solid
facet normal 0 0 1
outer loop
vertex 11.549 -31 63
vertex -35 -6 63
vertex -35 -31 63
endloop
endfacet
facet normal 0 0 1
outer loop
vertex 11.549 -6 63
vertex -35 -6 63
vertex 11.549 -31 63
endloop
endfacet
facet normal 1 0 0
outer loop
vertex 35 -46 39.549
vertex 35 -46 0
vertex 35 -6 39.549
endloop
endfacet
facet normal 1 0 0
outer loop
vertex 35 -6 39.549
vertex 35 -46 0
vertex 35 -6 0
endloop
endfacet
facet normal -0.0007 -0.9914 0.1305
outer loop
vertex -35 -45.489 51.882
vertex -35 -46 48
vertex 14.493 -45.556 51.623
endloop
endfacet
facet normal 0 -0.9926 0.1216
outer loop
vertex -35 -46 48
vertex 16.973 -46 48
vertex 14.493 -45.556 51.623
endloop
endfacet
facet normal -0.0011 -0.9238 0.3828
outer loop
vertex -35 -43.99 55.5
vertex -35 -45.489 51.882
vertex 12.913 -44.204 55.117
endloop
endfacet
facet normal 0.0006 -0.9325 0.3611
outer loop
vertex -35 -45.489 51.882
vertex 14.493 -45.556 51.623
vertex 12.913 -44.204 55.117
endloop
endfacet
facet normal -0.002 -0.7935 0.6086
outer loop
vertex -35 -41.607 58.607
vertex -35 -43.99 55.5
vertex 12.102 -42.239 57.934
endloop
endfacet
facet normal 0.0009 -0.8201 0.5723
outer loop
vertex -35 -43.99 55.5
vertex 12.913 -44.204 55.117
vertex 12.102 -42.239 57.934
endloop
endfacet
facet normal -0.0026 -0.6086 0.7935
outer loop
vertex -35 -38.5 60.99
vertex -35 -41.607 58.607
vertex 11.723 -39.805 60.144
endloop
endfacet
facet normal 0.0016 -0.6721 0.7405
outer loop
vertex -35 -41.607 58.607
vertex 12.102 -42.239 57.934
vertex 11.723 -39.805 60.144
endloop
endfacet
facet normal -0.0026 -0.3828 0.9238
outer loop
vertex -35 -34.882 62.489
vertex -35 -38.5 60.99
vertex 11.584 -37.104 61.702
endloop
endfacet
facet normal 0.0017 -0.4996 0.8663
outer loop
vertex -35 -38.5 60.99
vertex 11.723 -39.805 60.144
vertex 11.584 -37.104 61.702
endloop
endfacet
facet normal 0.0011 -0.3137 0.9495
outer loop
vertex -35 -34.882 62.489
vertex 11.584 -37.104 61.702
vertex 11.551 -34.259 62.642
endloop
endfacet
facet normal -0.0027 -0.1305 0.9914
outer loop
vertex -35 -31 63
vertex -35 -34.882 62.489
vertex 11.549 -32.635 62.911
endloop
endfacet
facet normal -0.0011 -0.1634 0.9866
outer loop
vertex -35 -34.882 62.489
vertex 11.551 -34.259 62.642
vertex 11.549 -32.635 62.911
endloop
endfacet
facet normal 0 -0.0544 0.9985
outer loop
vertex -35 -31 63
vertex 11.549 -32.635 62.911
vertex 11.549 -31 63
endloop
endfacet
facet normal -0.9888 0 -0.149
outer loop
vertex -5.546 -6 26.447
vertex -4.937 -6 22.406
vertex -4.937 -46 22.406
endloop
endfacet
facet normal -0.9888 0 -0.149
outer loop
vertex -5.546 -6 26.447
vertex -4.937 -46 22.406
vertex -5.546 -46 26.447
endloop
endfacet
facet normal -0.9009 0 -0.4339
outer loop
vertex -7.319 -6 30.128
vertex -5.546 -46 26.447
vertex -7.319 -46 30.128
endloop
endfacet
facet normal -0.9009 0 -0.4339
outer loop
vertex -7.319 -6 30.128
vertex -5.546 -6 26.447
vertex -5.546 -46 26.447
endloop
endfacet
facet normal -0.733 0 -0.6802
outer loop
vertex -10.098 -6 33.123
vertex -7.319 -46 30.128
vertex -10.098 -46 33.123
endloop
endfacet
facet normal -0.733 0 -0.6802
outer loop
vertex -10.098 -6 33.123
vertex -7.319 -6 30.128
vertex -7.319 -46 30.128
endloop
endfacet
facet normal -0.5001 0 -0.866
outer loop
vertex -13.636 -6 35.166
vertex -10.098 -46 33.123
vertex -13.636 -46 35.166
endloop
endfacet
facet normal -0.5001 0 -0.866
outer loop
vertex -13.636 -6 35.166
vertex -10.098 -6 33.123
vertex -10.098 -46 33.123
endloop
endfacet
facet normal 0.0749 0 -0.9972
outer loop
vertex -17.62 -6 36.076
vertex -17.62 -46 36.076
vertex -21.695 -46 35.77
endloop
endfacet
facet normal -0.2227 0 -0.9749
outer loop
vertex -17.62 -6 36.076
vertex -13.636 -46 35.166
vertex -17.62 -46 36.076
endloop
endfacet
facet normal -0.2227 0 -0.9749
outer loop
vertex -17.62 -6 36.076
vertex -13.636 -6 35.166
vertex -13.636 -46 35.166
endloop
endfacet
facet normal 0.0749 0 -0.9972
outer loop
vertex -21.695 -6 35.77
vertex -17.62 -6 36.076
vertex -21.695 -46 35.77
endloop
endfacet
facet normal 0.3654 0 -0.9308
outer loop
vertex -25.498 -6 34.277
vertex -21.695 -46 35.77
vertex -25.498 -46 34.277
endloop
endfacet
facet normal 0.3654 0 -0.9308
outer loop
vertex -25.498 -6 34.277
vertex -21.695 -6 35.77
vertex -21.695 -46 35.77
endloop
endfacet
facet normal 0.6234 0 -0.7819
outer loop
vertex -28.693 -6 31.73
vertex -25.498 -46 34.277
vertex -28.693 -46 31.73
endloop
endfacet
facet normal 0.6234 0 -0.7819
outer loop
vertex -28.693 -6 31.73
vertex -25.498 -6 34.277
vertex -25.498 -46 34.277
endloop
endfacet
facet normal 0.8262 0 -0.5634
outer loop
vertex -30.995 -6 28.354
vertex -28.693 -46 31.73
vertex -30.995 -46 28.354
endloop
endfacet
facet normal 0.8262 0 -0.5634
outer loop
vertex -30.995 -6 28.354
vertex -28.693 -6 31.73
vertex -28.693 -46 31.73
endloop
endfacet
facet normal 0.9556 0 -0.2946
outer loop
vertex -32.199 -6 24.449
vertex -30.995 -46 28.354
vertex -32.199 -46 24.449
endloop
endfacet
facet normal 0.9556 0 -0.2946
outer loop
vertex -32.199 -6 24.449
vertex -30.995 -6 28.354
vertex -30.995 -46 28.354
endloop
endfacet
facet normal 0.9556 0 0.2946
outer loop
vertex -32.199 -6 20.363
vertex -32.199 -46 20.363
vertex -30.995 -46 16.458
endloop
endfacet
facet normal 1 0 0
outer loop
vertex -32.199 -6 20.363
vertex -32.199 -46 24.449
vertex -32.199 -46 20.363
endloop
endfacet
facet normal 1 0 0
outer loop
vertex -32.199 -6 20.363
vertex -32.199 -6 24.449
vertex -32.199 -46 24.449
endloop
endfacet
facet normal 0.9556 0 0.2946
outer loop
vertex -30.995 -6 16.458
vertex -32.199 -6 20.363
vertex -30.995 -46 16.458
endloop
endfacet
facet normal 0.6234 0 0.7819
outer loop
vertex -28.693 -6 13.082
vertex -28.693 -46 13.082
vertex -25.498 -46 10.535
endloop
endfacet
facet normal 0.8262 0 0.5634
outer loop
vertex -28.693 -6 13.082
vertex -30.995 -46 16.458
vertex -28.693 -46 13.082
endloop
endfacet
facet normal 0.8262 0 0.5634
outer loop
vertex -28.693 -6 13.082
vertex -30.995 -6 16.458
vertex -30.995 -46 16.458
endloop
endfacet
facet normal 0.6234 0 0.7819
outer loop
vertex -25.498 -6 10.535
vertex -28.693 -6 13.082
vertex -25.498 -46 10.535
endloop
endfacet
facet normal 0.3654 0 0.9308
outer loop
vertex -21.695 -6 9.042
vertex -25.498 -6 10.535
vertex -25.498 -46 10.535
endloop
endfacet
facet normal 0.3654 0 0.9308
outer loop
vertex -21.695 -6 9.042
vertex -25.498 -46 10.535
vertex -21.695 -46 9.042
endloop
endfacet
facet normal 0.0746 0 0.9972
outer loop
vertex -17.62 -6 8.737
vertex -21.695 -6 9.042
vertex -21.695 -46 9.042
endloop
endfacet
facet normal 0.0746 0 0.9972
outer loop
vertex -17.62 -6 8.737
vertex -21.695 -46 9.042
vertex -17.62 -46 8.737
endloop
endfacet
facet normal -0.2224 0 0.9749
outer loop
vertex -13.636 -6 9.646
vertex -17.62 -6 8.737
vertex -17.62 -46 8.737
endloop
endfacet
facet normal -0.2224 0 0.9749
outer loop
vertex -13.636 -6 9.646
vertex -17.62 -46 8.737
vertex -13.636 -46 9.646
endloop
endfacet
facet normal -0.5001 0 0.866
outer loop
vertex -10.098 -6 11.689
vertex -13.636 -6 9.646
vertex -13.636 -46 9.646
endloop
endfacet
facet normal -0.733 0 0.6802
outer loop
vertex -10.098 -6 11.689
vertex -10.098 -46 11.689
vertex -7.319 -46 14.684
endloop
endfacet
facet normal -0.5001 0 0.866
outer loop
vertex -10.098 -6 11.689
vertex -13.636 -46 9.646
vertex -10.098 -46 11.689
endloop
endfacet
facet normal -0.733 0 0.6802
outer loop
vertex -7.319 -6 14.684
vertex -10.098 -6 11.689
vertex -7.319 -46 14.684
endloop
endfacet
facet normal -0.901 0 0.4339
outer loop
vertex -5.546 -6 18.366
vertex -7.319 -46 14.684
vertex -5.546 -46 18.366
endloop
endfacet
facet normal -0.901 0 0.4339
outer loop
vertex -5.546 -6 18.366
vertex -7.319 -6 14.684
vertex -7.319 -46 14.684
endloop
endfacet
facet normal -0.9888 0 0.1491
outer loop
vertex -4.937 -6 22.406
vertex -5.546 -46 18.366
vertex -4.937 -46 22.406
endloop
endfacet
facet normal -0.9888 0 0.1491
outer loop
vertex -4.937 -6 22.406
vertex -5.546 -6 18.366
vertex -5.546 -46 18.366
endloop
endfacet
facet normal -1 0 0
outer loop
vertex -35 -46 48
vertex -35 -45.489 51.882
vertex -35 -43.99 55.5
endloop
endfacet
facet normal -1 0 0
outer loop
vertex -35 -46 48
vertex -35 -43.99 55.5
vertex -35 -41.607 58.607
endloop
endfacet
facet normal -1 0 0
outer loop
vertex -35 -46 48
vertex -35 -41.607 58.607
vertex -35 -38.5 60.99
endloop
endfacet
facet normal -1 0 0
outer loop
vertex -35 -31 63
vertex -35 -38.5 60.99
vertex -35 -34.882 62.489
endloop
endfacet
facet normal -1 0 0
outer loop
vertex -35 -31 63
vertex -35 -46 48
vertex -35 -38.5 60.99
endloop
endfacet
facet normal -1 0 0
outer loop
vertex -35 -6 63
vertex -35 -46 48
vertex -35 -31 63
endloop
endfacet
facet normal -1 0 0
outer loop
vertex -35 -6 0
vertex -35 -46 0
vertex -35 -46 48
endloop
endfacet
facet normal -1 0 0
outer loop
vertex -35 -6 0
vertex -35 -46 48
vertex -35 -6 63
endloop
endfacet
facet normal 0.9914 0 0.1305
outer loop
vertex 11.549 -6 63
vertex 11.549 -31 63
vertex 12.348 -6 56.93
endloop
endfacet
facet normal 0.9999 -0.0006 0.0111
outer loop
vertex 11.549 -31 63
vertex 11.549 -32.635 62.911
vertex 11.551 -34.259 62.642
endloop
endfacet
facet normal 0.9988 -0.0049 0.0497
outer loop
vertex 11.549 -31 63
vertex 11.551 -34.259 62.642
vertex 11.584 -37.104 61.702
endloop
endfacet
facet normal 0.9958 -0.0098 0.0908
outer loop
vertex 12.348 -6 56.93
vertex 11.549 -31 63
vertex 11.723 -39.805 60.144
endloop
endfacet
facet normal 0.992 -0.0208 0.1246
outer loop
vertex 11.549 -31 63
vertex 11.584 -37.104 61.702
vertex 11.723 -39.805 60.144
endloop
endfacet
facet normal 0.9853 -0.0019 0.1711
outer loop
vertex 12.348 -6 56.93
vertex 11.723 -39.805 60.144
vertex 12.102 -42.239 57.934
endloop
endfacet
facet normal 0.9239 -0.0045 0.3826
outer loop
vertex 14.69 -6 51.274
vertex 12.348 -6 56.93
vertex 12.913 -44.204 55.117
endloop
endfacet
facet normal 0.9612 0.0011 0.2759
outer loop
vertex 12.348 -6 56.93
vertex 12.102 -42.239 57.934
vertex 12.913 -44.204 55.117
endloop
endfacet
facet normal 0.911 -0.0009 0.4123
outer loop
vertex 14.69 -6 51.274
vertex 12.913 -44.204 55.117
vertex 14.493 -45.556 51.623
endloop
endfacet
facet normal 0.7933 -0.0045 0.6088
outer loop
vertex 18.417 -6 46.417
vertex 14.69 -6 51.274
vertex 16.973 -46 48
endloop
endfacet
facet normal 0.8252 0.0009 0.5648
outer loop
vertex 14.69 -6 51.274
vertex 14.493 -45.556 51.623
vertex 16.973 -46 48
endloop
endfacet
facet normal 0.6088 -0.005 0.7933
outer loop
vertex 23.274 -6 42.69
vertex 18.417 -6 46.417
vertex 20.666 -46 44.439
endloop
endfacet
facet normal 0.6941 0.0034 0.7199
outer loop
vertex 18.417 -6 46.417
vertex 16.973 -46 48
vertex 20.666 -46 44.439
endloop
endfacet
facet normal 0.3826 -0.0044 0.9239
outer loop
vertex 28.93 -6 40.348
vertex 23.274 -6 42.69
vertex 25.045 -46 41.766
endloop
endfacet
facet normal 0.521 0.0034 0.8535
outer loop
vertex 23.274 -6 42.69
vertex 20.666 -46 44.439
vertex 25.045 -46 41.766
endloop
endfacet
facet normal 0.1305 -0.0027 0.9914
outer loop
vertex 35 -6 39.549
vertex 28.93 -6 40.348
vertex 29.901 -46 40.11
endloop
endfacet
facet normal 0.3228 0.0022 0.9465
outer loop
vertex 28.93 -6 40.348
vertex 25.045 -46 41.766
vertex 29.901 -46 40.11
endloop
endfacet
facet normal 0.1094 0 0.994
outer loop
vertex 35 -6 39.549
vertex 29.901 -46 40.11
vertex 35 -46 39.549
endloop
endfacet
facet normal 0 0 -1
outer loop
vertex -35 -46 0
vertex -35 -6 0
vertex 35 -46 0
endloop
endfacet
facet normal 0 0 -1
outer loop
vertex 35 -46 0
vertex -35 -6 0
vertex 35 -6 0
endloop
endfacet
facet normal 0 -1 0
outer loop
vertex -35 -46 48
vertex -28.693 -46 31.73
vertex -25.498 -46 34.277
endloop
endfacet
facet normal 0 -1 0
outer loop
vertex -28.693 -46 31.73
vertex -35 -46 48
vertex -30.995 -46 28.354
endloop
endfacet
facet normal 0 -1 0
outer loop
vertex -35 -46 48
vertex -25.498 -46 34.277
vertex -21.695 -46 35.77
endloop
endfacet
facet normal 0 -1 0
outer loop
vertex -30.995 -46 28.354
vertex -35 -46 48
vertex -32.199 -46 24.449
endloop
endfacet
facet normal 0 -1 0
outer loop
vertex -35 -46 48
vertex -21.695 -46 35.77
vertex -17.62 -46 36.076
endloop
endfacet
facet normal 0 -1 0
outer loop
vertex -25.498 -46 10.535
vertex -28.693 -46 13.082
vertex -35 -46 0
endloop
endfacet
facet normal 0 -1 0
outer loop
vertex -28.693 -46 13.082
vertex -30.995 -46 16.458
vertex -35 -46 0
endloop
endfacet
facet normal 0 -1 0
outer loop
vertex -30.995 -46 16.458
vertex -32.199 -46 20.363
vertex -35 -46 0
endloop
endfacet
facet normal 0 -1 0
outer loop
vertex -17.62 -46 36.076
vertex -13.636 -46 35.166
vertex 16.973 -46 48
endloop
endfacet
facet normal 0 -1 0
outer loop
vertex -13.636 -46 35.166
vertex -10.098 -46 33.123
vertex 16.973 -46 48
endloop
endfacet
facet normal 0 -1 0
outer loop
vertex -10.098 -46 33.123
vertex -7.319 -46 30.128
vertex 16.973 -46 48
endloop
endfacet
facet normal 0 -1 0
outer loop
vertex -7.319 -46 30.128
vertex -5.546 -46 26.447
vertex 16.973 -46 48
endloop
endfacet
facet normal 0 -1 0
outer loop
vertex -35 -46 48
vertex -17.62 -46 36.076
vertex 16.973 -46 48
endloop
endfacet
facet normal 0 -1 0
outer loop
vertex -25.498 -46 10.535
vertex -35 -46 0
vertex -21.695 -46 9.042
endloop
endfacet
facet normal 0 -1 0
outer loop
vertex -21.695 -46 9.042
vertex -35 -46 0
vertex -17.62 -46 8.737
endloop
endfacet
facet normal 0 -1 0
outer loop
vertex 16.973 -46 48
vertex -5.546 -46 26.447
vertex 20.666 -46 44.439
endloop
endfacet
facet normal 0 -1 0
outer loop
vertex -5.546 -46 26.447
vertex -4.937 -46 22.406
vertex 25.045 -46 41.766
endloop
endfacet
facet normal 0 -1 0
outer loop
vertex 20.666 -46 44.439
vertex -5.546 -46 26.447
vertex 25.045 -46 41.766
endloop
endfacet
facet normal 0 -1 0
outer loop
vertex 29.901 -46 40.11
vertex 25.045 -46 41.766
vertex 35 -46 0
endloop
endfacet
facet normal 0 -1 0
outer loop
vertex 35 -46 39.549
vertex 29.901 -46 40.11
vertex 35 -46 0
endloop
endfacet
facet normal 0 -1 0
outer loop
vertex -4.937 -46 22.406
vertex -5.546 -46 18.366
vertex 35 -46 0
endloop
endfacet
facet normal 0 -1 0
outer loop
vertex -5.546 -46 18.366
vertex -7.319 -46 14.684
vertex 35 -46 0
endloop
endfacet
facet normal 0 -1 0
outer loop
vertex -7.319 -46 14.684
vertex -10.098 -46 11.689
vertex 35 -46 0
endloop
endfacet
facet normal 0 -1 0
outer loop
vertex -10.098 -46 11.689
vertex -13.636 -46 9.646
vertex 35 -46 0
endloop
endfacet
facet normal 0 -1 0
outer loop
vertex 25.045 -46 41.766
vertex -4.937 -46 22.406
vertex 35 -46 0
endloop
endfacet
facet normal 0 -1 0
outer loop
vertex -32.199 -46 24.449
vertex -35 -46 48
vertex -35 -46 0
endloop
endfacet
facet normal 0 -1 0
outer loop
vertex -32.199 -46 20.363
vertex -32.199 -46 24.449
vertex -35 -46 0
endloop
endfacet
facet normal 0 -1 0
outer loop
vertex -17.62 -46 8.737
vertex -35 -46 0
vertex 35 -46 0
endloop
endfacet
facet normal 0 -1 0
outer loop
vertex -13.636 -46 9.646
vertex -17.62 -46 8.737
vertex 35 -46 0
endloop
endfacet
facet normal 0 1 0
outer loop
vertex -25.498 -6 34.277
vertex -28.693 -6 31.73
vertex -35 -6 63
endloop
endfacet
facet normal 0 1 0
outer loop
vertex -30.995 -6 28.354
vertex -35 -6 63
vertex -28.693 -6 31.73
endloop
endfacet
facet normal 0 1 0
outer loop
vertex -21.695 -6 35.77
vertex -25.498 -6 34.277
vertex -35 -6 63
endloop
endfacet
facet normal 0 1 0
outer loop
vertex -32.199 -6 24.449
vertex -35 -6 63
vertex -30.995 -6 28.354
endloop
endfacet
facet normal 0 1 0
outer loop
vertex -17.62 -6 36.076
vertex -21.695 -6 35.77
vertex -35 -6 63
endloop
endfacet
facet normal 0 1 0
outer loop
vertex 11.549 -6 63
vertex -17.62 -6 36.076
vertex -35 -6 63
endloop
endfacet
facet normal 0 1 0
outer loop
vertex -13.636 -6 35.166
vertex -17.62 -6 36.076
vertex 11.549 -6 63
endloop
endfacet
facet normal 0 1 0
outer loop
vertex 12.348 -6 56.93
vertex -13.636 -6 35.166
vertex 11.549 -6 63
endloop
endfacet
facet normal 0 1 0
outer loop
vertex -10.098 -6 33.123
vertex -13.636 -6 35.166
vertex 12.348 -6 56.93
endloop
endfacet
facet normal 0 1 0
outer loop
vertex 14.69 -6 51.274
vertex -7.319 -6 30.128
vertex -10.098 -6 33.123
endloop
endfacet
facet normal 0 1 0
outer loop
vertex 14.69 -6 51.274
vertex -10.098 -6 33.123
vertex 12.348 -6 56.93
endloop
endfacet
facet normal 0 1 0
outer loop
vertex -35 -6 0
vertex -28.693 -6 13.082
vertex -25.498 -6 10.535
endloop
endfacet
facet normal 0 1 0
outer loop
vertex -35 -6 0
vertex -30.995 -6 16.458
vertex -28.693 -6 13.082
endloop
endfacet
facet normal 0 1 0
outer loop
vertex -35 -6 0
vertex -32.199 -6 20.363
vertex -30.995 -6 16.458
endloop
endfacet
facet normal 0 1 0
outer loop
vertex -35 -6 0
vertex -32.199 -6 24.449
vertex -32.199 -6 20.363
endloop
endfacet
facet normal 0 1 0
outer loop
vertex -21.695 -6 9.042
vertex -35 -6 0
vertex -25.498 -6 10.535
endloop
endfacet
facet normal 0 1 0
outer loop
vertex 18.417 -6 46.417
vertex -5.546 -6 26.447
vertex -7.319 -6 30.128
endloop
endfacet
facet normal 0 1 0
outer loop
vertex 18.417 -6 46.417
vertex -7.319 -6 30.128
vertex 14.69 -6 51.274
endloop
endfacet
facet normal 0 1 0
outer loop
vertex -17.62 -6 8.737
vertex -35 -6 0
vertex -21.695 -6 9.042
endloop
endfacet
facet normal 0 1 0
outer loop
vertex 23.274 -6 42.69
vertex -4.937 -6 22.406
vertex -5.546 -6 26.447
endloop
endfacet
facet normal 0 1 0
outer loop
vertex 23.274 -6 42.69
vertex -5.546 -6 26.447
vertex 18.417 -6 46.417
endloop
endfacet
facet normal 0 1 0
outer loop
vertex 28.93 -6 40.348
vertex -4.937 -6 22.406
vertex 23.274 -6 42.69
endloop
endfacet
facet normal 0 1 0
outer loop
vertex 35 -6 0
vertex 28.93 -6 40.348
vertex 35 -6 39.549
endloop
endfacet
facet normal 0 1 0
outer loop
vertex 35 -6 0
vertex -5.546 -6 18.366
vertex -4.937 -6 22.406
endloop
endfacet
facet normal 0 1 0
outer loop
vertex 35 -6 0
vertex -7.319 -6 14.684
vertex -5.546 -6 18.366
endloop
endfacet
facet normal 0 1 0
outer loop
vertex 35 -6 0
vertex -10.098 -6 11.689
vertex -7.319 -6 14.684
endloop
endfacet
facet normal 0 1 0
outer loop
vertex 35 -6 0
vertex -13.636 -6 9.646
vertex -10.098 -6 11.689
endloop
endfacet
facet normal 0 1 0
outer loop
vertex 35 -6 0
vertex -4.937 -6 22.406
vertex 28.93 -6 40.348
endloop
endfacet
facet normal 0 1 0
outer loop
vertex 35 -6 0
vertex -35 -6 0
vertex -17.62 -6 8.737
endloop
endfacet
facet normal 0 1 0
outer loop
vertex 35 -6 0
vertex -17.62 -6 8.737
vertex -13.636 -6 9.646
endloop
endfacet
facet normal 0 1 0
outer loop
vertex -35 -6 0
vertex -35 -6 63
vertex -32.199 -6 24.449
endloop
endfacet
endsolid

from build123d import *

# Parameters (mm, degrees)
F0_W     = 70
F0_H     = 40
F1_DEPTH = 63
F2_R     = 23.451483
F3_DEPTH = 74
F4_R     = 13.707811
F5_DEPTH = 87.035492
F6_R     = 15


with BuildPart() as f1:
    # F0 (on Top) → F1 (new body)
    with BuildSketch(Plane.XY):
        with Locations((0, -26)):
            Rectangle(F0_W, F0_H)
    extrude(amount=F1_DEPTH)

    # F2 (on face) → F3 (cut)
    with BuildSketch(Plane.XZ.offset(46)):
        with Locations((35, 63)):
            Circle(F2_R)
    extrude(amount=-F3_DEPTH, mode=Mode.SUBTRACT)

    # F4 (on Front) → F5 (cut)
    with BuildSketch(Plane.XZ):
        with Locations((-18.644467, 22.406071)):
            Circle(F4_R)
    extrude(amount=F5_DEPTH, mode=Mode.SUBTRACT)

    # F6
    f6_edges = [f1.edges().sort_by_distance(p)[0] for p in [
        (-11.725742, -46, 63),
    ]]
    fillet(f6_edges, radius=F6_R)


solid = f1.part
